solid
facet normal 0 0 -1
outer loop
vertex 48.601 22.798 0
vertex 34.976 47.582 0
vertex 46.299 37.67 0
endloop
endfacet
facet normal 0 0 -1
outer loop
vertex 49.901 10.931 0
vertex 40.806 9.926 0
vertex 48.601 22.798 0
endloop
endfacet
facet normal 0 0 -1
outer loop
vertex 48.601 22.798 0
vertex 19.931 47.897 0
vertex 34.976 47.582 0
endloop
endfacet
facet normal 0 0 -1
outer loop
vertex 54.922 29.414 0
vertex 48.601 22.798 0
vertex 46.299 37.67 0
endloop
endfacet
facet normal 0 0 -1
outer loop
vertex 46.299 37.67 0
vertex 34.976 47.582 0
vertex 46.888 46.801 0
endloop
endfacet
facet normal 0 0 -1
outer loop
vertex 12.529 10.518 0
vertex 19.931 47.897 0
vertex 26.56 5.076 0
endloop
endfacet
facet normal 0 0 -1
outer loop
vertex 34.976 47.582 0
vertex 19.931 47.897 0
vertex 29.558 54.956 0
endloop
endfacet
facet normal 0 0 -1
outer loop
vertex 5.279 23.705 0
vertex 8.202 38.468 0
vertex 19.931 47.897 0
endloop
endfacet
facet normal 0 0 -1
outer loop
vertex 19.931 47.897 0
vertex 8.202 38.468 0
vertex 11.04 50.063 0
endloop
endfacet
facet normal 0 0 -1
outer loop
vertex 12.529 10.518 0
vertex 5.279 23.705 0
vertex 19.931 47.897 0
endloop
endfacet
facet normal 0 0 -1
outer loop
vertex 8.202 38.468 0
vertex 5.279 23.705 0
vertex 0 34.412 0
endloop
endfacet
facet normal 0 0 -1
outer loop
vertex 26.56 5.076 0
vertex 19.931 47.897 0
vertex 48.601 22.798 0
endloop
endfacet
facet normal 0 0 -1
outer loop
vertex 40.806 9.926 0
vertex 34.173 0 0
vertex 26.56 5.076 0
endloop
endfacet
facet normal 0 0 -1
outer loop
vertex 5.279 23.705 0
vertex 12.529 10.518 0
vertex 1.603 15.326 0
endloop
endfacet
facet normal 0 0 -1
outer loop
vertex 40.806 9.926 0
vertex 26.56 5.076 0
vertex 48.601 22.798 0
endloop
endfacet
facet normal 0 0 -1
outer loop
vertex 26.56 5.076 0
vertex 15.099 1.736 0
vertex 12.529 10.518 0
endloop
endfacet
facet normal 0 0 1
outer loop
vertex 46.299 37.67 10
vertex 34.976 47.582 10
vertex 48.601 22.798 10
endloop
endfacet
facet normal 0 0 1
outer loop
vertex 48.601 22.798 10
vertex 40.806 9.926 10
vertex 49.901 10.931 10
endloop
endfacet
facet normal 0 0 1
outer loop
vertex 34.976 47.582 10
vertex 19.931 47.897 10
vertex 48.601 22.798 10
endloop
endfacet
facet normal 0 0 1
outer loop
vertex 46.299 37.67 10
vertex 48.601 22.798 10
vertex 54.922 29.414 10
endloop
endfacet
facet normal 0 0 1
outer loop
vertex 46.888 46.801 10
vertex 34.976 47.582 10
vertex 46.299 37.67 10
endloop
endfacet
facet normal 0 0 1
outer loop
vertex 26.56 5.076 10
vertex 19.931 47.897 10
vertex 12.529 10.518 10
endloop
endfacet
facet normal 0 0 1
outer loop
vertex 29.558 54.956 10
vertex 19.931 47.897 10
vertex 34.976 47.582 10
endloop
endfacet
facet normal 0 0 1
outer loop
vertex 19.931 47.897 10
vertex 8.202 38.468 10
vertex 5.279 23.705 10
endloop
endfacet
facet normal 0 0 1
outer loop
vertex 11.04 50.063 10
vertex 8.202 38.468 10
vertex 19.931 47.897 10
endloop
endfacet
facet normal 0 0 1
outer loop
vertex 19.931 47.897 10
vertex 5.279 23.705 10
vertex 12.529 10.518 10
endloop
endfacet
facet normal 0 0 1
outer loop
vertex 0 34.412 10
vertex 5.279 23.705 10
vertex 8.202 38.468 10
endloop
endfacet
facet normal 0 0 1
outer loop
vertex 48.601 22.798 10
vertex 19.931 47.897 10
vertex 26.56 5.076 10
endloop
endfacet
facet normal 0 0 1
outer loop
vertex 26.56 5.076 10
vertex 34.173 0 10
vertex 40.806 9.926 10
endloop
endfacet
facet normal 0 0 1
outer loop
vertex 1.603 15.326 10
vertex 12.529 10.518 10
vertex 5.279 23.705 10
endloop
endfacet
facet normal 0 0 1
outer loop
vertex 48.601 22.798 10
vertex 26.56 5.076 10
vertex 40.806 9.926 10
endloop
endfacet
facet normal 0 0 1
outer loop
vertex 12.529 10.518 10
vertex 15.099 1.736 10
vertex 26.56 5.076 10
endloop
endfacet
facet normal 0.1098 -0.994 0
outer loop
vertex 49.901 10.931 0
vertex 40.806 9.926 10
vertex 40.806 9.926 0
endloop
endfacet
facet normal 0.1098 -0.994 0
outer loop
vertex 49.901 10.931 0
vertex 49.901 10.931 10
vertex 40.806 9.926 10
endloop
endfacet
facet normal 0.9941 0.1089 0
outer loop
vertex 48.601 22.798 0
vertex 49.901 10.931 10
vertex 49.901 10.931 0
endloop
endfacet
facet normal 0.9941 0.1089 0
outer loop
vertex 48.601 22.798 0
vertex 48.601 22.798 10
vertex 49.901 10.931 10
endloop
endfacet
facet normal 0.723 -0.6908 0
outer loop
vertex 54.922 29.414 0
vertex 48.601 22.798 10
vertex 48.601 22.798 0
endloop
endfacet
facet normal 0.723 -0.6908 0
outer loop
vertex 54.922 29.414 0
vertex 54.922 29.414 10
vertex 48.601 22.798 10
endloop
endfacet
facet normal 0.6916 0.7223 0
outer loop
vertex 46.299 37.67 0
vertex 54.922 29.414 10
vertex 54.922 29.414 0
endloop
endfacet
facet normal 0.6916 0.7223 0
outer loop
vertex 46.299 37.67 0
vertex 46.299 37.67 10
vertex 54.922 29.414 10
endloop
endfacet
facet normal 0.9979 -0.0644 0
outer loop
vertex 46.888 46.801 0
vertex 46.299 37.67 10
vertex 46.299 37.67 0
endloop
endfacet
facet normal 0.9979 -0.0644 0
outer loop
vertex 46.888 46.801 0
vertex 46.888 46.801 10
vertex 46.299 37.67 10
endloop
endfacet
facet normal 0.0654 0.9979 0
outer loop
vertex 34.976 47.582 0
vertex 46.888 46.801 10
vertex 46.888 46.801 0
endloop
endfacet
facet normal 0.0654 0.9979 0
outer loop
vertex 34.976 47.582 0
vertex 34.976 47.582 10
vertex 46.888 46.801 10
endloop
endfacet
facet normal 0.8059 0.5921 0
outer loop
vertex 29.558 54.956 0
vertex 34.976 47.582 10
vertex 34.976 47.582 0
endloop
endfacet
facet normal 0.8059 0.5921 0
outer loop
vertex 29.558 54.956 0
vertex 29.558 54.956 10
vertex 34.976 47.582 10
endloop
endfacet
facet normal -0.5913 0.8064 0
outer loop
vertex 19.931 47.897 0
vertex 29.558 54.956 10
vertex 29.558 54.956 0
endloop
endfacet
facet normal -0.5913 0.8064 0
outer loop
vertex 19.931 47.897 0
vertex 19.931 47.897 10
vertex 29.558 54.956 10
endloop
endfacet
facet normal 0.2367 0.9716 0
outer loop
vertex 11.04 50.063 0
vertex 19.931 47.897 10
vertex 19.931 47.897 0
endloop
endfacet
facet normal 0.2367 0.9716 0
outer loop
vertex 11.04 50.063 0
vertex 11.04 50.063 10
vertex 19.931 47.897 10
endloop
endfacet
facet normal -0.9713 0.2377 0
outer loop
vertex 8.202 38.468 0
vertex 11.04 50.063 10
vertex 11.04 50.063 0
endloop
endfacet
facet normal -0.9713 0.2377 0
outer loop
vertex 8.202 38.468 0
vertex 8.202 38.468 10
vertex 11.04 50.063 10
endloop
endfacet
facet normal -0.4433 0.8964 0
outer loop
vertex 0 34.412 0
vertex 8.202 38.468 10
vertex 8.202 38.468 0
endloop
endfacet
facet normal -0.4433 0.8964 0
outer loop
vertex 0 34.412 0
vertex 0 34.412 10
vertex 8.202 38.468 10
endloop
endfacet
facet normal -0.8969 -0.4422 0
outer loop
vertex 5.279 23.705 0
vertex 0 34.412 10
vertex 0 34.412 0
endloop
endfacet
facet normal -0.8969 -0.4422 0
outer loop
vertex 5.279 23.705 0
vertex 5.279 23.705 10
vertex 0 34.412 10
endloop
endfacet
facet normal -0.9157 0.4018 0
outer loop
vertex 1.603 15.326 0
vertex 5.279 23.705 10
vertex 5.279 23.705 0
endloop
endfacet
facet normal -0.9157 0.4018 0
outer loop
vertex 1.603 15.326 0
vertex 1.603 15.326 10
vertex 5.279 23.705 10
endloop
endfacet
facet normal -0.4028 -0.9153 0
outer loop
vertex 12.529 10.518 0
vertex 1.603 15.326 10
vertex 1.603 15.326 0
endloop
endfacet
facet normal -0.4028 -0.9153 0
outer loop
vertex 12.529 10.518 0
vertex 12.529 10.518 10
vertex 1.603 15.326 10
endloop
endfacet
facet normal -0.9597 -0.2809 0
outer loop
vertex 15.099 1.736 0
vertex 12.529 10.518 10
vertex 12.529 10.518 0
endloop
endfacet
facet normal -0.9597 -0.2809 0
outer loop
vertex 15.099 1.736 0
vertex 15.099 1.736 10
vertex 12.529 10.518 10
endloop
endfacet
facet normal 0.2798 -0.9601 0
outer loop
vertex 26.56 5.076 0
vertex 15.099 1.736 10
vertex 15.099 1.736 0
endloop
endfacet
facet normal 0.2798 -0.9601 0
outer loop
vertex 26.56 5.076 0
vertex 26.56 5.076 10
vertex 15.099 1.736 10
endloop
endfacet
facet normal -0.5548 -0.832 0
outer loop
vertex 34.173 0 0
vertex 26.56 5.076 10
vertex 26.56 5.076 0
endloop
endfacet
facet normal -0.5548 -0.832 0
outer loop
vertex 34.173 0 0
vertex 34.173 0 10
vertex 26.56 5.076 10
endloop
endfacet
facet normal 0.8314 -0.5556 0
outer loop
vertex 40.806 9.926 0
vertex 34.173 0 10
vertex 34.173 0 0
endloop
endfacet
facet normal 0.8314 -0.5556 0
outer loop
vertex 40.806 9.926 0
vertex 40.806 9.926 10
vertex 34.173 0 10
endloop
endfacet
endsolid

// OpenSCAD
$fn = 32;

// ----------------------------------------------------------------------
// Chain sprocket: 9 teeth, 22 mm root radius
// ----------------------------------------------------------------------

// --- parameters (mm) ---
profile_height = 10;      // extrusion height
profile_points = 18;      // points of the closed outline

profile = [[48.601, 22.798], [54.922, 29.414], [46.299, 37.67], [46.888, 46.801], [34.976, 47.582], [29.558, 54.956], [19.931, 47.897], [11.04, 50.063], [8.202, 38.468], [0, 34.412], [5.279, 23.705], [1.603, 15.326], [12.529, 10.518], [15.099, 1.736], [26.56, 5.076], [34.173, 0], [40.806, 9.926], [49.901, 10.931]];  // single closed polygon, 18 points, counter clockwise

// --- the one profile operation ---
linear_extrude(height = profile_height) polygon(points = profile);
